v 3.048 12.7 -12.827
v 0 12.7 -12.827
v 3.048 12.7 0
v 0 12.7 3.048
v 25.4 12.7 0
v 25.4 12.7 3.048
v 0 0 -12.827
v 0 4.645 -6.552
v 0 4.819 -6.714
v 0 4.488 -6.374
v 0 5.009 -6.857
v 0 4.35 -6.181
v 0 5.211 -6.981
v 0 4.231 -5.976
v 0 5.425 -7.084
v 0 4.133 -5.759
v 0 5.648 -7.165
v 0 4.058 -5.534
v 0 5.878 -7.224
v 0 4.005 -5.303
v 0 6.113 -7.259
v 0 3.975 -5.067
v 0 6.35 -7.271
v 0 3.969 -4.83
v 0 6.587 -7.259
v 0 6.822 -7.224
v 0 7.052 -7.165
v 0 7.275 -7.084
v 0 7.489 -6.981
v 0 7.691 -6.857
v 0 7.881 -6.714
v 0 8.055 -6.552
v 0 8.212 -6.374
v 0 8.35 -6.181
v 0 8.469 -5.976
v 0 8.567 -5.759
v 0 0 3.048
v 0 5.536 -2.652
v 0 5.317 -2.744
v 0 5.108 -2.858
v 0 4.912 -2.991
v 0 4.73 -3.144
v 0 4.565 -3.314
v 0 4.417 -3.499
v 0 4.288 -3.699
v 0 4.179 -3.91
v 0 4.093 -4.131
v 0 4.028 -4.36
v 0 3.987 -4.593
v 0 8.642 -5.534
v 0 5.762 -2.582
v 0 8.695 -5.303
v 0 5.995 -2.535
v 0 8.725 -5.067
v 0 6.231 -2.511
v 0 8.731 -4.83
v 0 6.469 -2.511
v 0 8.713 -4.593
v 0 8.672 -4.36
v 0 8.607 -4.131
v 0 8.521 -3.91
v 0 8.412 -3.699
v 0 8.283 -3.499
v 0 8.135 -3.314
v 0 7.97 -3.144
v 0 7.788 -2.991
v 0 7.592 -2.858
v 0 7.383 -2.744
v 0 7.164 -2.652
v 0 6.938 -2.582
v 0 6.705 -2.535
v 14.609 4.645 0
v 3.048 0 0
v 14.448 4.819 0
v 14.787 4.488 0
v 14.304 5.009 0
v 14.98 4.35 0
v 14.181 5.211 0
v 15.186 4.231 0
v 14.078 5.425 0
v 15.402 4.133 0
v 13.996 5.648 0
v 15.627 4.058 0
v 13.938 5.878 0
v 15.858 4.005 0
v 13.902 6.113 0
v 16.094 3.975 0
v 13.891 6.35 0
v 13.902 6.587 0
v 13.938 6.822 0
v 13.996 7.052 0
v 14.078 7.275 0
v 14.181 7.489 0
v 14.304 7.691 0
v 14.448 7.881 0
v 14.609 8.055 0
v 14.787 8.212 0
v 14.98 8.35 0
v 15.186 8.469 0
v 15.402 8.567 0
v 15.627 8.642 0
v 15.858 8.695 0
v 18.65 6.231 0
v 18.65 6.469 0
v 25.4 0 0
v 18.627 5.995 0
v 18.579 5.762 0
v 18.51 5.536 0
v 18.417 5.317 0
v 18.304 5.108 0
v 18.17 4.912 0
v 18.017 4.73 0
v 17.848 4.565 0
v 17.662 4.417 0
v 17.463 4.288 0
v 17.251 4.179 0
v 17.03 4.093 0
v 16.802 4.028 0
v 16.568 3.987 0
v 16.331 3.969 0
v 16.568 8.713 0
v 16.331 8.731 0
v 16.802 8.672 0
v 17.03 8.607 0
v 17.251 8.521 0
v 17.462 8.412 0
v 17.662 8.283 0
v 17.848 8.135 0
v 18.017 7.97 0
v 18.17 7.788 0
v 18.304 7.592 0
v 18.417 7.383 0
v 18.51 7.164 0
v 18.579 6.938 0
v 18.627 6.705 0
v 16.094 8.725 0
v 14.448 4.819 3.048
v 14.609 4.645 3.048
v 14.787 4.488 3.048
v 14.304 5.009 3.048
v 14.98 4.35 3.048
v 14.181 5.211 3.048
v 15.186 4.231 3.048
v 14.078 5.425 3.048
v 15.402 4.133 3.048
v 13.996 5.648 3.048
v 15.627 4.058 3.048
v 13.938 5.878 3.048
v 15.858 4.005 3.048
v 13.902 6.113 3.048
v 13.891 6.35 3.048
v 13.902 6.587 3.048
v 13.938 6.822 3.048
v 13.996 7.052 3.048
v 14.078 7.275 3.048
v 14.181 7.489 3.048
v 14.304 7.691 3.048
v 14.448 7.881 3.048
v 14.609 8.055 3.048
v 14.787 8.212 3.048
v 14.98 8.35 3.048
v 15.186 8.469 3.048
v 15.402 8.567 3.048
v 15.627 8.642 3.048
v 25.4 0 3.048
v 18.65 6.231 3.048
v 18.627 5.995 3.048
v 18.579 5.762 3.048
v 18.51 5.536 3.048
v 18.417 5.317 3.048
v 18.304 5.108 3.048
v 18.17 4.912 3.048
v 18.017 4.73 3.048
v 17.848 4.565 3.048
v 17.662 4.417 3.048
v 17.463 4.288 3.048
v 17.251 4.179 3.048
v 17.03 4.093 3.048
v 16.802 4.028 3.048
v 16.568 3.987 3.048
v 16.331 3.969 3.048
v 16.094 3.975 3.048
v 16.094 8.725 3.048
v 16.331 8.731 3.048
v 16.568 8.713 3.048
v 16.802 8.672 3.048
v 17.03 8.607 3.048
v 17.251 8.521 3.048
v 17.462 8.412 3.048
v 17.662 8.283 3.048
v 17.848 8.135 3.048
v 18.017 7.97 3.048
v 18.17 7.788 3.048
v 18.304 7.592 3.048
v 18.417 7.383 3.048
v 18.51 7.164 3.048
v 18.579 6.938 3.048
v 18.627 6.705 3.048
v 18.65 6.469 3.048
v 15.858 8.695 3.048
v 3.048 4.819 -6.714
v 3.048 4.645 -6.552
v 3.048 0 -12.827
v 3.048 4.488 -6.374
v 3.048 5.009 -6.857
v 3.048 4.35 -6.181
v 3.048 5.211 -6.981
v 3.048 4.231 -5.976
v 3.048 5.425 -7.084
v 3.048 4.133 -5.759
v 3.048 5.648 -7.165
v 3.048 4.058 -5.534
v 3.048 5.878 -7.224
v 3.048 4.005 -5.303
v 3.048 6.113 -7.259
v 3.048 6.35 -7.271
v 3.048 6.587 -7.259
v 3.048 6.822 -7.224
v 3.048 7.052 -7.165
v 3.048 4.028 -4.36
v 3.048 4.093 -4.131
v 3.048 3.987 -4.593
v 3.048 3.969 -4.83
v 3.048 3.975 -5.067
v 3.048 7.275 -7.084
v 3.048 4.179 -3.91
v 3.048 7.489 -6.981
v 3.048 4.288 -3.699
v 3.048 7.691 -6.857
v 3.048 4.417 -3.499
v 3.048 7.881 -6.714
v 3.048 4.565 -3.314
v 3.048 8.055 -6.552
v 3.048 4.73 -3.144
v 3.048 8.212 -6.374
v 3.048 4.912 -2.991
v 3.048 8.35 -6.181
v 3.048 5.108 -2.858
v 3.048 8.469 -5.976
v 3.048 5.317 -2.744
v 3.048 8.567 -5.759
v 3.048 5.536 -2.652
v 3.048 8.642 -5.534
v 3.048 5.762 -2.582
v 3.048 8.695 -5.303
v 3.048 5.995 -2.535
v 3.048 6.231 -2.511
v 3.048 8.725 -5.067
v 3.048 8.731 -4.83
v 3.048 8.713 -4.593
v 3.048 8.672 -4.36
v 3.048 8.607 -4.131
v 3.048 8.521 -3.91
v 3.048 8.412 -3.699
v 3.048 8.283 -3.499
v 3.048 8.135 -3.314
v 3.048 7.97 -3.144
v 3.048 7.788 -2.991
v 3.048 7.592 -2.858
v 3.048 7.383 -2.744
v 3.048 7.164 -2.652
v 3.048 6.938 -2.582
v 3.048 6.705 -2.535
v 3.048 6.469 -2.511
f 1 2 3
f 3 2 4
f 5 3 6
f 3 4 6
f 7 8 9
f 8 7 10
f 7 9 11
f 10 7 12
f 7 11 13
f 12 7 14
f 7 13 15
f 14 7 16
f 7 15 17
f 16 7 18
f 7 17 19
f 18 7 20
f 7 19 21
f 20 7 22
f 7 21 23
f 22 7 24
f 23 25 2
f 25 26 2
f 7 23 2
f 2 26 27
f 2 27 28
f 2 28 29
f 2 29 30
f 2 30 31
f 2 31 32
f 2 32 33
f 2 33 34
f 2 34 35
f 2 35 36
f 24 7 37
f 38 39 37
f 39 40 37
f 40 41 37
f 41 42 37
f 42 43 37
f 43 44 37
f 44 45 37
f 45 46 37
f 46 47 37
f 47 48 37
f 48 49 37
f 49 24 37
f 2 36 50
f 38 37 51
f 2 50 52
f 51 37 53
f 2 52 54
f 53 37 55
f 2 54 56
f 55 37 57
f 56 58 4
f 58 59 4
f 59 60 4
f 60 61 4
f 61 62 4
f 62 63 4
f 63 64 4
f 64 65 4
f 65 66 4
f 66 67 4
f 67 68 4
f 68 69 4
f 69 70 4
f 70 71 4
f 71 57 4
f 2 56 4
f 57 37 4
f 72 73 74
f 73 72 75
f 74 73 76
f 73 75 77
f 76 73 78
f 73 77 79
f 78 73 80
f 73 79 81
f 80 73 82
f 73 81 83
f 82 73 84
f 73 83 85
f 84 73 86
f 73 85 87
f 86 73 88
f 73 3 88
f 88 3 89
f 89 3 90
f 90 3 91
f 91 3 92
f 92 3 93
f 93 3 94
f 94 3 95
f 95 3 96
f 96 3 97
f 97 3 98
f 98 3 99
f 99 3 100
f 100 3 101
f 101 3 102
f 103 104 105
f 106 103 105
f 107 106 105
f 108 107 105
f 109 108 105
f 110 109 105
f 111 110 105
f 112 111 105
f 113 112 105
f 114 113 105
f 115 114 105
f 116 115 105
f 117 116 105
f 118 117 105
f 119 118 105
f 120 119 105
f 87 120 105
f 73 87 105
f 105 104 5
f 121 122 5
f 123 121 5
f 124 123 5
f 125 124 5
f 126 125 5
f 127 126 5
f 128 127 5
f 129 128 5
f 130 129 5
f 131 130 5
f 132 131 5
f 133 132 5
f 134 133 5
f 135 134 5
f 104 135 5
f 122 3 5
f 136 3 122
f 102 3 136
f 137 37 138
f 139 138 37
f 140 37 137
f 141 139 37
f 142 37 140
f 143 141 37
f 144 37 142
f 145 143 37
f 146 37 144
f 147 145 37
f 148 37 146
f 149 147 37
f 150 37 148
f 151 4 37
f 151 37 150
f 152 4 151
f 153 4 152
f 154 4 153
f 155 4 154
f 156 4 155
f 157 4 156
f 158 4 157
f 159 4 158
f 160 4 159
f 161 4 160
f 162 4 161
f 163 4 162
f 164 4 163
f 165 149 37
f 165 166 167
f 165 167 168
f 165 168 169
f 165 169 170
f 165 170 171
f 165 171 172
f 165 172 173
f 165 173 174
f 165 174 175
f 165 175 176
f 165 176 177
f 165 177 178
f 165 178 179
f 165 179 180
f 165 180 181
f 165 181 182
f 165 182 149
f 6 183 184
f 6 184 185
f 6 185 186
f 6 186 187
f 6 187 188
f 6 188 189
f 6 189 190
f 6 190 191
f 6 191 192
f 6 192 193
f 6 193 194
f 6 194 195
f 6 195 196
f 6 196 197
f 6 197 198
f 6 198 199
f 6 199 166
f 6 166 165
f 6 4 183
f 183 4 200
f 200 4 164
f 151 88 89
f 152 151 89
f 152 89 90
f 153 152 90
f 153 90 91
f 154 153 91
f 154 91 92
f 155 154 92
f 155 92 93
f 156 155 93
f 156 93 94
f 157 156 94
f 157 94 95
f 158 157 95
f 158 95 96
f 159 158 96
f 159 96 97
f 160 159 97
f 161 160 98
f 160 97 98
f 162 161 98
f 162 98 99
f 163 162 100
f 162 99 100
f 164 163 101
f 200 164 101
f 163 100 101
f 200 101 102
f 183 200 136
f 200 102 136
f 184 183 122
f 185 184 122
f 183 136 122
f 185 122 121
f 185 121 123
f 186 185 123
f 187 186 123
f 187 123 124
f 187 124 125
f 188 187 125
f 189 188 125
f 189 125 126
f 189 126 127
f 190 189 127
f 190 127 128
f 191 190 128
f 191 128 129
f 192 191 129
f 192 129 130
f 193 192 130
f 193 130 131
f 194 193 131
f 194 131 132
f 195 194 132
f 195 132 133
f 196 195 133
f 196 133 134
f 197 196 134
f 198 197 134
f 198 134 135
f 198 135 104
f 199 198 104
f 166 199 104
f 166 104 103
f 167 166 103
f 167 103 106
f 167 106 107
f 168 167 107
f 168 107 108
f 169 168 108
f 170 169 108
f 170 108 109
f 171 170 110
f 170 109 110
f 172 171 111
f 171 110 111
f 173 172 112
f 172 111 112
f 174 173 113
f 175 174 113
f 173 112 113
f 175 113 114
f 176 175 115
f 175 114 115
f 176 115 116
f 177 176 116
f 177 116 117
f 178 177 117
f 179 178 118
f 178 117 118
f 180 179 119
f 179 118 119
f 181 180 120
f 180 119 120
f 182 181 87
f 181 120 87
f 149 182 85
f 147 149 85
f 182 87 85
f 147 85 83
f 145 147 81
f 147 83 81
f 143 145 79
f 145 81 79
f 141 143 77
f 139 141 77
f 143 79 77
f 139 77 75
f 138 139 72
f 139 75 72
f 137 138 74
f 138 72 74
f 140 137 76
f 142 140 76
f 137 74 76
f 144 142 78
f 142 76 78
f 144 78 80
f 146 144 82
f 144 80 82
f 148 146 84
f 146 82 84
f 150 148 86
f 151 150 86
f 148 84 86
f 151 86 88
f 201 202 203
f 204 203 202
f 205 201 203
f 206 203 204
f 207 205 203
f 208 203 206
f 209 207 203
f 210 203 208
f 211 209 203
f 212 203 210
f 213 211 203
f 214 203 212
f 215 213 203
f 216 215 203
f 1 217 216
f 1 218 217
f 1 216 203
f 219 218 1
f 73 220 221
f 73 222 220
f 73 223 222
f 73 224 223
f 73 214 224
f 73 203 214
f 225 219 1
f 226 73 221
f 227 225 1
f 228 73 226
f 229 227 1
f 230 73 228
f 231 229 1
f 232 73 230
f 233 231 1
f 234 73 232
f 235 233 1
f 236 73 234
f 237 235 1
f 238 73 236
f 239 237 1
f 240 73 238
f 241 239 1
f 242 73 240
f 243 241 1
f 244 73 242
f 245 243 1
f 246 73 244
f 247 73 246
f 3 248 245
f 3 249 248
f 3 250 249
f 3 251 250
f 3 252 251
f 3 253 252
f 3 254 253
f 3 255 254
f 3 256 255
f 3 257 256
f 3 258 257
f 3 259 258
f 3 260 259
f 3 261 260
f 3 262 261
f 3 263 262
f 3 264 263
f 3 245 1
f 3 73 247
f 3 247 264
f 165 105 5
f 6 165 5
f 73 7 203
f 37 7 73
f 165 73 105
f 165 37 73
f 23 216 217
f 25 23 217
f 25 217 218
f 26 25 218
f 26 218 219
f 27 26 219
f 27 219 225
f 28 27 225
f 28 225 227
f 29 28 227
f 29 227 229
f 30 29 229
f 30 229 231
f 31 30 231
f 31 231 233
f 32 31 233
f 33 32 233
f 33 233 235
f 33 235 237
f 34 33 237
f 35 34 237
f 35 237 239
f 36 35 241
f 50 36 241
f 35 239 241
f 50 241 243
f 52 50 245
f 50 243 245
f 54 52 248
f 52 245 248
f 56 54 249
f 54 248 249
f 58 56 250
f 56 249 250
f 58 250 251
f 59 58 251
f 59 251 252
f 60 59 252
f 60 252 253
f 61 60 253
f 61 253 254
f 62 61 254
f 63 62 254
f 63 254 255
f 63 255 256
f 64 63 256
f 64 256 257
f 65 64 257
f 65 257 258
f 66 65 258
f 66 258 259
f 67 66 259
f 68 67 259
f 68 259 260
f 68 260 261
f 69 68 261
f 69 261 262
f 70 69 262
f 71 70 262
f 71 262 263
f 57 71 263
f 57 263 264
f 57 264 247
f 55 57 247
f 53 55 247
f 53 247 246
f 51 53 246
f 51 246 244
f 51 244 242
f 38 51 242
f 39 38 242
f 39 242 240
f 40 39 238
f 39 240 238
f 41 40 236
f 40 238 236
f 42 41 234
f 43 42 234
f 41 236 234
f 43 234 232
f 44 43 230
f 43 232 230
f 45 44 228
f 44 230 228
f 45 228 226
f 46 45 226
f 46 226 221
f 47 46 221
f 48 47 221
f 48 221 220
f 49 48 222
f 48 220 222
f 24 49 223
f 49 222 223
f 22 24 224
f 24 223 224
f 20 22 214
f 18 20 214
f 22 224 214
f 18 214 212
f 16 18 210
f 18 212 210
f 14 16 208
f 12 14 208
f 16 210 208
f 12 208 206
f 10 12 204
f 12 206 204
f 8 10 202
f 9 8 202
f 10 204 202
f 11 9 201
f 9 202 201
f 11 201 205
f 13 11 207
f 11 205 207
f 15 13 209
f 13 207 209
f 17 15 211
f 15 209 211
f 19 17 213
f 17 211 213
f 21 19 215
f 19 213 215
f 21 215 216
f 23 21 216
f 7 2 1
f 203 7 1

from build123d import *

# Parameters (mm, degrees)
SKETCH1_W           = 25.4
SKETCH1_H           = 12.7
BOSS_EXTRUDE1_DEPTH = 3.048
SKETCH2_W           = 3.048
SKETCH2_H           = 12.7
BOSS_EXTRUDE2_DEPTH = 15.875
SKETCH3_R           = 2.38125
CUT_EXTRUDE1_DEPTH  = 4.048
SKETCH4_R           = 2.38125
CUT_EXTRUDE2_DEPTH  = 4.048


with BuildPart() as part:
    # Sketch1 → Boss-Extrude1 (new body)
    with BuildSketch(Plane.XY):
        with Locations((12.7, 6.35)):
            Rectangle(SKETCH1_W, SKETCH1_H)
    extrude(amount=BOSS_EXTRUDE1_DEPTH)

    # Sketch2 → Boss-Extrude2 (add)
    with BuildSketch(Plane.XY.offset(3.048)):
        with Locations((1.524, 6.35)):
            Rectangle(SKETCH2_W, SKETCH2_H)
    extrude(amount=-BOSS_EXTRUDE2_DEPTH)

    # Sketch3 → Cut-Extrude1 (cut, through all)
    with BuildSketch(Plane(origin=(0, 0, 0), x_dir=(-1, 0, 0), z_dir=(0, 0, -1))):
        with Locations((-16.271875, 6.35)):
            Circle(SKETCH3_R)
    extrude(amount=-CUT_EXTRUDE1_DEPTH, mode=Mode.SUBTRACT)

    # Sketch4 → Cut-Extrude2 (cut, through all)
    with BuildSketch(Plane(origin=(3.048, 0, 0), x_dir=(0, 0, -1), z_dir=(1, 0, 0))):
        with Locations((4.8895, 6.35)):
            Circle(SKETCH4_R)
    extrude(amount=-CUT_EXTRUDE2_DEPTH, mode=Mode.SUBTRACT)


solid = part.part
